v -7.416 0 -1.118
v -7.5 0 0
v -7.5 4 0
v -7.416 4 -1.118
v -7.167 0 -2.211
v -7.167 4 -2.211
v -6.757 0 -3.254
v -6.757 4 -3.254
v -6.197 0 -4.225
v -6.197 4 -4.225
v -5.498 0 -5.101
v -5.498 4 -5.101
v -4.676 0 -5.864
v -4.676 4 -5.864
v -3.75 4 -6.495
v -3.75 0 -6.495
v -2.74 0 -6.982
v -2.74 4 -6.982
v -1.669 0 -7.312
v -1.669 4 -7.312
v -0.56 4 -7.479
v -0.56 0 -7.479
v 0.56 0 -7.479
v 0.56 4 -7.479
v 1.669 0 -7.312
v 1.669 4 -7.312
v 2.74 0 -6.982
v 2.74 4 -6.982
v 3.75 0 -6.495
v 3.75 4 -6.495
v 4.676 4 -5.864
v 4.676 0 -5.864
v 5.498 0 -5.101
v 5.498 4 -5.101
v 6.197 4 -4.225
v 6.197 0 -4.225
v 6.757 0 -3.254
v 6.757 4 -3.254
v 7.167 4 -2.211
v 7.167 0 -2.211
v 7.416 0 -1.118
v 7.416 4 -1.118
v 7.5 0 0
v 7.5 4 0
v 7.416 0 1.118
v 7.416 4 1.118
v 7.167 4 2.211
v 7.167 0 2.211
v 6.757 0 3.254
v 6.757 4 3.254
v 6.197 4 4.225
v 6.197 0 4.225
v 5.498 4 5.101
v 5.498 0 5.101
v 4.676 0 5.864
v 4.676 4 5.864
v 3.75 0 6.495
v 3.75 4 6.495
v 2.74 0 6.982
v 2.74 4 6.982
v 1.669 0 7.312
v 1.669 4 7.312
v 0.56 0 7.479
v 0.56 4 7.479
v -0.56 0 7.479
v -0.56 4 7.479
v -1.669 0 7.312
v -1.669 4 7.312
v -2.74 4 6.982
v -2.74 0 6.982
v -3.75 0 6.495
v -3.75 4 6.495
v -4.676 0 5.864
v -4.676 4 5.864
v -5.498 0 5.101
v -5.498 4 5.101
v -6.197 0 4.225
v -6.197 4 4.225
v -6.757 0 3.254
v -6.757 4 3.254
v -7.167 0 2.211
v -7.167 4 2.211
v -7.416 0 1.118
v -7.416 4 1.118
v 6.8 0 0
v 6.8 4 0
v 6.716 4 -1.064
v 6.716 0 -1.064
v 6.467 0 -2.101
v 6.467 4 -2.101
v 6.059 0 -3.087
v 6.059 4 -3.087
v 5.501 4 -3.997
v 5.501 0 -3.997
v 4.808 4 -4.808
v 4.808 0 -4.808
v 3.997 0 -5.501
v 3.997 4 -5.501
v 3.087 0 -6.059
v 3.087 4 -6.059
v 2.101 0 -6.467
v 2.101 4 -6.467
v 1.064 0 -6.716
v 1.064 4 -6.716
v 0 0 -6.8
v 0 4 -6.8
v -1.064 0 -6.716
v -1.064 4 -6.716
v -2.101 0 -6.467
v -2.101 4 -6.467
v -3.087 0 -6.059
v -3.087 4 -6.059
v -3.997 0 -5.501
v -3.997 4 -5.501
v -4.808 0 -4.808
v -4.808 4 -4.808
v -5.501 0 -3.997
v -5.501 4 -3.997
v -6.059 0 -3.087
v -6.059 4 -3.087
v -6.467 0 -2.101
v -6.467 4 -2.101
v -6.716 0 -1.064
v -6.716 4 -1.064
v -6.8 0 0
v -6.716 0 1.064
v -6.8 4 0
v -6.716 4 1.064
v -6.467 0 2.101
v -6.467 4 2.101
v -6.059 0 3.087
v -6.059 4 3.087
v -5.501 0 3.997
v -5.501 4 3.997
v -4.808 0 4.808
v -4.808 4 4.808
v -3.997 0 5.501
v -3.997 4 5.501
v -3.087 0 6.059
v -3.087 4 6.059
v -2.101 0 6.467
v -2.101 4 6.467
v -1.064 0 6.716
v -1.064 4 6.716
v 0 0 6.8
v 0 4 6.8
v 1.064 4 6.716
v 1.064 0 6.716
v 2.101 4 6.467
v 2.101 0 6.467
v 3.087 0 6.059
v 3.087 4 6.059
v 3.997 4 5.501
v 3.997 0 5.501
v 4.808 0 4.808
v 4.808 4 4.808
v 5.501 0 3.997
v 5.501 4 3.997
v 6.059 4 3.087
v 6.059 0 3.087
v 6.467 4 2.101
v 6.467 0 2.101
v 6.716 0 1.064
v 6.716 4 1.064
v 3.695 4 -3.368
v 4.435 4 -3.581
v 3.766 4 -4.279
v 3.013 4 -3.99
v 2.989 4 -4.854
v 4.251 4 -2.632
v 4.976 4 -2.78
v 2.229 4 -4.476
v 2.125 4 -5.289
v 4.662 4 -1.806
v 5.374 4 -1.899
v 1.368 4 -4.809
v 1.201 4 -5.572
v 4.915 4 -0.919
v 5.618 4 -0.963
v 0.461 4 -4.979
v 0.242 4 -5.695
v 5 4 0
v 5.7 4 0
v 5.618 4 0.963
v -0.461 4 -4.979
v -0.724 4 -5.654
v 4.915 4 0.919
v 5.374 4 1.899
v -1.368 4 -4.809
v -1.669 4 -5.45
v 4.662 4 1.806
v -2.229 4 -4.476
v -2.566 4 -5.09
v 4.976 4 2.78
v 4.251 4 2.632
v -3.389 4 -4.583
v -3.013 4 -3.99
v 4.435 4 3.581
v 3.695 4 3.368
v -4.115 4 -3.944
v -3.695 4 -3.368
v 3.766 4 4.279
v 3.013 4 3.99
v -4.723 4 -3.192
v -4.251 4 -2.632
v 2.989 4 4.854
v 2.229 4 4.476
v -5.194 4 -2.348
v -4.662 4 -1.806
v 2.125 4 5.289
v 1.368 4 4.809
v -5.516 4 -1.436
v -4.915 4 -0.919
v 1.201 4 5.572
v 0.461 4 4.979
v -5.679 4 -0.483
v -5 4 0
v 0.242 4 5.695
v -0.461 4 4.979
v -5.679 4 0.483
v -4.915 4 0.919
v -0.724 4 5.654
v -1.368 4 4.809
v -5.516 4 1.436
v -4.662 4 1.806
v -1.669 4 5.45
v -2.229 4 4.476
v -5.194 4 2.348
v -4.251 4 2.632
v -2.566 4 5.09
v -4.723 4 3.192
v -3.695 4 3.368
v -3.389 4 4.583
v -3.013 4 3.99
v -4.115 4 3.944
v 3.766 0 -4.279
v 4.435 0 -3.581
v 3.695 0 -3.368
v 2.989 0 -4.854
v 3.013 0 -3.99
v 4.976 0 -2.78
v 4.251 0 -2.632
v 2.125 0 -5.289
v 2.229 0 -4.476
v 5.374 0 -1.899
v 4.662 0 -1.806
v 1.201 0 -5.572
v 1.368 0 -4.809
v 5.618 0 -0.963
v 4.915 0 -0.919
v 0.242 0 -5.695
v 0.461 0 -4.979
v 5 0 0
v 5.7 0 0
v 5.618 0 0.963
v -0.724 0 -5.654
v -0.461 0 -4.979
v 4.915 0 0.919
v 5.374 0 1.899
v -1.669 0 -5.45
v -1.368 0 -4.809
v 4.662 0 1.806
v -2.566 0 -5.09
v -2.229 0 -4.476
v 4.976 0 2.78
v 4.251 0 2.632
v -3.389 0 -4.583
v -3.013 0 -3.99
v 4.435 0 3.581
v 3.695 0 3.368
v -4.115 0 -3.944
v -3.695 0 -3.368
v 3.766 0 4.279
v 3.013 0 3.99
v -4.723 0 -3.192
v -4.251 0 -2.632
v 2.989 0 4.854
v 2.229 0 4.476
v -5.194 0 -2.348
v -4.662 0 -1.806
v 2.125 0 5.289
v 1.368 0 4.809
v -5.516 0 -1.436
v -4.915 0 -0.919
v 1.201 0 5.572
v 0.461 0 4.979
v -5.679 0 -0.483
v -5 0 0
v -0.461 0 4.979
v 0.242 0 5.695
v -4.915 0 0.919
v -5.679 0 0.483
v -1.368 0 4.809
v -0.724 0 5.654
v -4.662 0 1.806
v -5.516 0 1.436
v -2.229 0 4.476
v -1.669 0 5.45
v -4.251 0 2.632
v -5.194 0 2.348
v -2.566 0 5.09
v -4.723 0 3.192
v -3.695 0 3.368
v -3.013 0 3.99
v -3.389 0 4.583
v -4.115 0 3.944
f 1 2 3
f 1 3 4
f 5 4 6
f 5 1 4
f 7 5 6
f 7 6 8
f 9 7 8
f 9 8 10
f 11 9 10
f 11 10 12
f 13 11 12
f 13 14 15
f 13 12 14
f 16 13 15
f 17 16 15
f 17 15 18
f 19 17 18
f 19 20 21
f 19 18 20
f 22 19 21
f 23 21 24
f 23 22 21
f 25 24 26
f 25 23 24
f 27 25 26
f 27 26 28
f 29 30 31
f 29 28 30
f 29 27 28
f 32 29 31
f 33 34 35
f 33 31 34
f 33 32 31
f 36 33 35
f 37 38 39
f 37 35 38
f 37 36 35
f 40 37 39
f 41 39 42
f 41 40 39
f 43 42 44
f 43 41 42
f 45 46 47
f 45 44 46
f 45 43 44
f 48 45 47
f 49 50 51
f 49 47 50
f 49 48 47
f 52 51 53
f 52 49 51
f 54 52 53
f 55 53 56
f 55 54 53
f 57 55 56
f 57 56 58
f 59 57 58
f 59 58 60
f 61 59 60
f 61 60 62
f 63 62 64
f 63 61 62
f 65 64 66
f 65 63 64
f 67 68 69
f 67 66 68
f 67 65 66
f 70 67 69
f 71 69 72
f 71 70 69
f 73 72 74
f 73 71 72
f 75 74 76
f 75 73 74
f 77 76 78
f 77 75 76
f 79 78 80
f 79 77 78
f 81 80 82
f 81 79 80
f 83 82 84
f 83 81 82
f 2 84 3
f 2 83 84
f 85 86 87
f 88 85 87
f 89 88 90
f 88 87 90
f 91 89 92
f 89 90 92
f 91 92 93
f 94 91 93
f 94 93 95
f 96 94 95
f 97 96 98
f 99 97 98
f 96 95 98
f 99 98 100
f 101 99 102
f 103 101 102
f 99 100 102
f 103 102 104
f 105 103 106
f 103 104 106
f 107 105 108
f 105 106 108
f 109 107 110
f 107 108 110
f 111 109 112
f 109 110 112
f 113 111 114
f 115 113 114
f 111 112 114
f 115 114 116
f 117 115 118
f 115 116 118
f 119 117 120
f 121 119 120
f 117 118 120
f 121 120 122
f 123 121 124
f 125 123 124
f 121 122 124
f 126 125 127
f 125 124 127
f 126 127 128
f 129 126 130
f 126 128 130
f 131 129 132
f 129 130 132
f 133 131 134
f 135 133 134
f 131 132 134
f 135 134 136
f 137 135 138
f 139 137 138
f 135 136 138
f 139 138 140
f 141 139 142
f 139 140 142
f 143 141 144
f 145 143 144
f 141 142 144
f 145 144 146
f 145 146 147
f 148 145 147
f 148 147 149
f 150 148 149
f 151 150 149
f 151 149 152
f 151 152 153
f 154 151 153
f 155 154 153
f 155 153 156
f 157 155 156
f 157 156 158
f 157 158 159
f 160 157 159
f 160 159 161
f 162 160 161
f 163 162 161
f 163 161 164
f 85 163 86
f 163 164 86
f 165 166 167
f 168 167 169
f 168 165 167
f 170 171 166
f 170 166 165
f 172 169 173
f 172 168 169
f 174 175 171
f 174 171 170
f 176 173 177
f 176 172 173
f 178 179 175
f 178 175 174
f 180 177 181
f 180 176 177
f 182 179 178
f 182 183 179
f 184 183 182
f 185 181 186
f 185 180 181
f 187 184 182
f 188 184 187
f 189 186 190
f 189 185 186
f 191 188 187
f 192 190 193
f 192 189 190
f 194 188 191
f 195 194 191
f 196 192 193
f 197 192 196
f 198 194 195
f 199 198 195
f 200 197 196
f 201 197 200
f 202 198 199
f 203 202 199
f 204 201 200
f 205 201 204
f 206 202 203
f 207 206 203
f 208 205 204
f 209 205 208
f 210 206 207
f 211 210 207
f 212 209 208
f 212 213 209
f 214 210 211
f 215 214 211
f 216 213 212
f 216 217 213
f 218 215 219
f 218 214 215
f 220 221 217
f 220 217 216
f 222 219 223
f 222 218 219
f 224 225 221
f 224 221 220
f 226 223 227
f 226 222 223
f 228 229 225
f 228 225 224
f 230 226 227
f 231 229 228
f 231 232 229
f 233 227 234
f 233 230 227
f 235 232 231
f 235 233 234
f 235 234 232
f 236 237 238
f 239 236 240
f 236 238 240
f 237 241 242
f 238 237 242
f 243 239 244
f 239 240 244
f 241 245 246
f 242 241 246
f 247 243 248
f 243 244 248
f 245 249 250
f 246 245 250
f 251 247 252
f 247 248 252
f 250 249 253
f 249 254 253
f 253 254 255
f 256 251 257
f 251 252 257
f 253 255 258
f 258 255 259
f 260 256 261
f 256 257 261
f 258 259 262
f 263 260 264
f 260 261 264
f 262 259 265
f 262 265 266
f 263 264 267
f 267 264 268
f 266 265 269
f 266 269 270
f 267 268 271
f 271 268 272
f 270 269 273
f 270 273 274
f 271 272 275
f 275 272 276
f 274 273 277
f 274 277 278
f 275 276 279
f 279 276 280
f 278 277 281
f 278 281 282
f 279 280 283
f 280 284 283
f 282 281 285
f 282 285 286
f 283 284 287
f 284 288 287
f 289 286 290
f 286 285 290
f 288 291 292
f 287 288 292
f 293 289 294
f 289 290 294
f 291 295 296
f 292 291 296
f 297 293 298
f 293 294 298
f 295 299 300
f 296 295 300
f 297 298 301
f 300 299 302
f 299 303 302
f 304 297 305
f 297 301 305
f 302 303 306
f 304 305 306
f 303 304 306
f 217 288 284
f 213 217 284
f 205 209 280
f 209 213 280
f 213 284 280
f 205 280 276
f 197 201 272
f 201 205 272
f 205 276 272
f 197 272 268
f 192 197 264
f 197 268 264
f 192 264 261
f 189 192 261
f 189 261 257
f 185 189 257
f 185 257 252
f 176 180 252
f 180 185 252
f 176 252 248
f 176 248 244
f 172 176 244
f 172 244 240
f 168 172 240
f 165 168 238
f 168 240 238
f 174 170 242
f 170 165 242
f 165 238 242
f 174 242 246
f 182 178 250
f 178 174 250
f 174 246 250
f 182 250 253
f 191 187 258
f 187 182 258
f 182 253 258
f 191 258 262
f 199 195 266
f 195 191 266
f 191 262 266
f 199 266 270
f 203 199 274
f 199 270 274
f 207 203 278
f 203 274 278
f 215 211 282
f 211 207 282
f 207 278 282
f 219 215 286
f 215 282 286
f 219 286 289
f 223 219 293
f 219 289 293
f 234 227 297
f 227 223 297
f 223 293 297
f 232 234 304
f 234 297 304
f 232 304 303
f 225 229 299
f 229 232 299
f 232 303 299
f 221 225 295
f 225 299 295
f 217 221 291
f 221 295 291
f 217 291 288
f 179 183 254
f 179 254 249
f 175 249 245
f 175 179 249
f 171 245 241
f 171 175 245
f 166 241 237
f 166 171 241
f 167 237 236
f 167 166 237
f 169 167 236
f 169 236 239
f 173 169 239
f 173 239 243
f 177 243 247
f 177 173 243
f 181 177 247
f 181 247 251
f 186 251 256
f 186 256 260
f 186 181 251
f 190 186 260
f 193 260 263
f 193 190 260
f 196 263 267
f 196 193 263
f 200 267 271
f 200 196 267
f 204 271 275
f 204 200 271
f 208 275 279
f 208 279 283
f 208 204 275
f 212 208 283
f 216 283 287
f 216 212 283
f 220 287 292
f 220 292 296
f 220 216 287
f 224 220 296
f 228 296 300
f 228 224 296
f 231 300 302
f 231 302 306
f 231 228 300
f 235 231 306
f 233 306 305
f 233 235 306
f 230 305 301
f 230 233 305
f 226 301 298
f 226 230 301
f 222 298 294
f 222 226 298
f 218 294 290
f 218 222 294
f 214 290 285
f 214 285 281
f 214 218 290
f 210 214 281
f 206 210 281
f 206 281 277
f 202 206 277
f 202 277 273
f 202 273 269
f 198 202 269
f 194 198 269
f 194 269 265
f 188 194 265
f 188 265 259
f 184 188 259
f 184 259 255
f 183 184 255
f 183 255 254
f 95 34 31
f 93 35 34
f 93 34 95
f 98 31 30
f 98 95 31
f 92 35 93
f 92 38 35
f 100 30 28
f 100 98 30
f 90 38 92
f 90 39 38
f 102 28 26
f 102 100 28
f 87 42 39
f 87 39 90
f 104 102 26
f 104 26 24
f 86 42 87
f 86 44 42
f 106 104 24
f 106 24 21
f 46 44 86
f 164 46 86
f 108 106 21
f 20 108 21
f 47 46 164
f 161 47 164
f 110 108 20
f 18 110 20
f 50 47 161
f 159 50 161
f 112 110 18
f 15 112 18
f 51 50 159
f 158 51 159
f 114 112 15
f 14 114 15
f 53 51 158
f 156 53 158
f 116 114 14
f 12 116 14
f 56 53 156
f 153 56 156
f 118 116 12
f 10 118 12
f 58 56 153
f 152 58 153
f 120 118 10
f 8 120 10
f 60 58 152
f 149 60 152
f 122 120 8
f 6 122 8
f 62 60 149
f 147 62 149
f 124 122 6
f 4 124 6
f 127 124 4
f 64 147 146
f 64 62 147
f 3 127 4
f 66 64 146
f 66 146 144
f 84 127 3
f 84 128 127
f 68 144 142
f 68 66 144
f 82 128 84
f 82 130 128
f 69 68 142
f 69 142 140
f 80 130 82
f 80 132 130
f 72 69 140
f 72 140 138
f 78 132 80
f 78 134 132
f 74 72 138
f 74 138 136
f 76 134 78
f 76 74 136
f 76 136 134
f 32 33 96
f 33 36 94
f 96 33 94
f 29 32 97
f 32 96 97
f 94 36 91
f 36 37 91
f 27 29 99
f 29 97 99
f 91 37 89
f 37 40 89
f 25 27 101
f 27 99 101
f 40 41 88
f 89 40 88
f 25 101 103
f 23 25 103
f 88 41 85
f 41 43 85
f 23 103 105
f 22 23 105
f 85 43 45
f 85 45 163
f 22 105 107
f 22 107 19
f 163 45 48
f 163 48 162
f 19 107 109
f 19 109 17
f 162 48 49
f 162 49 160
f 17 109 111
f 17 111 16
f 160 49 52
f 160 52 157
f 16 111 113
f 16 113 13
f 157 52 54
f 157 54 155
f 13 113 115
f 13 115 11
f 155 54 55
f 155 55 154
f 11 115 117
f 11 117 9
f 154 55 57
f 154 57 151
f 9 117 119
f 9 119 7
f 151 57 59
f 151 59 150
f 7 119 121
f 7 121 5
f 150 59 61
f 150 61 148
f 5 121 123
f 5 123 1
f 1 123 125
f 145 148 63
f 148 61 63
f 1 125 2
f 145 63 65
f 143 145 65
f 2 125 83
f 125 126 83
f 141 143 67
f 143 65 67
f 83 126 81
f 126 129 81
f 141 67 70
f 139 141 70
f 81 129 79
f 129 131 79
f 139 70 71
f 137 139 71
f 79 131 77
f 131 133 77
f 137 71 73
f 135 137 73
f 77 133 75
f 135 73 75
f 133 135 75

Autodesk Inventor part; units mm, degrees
ref_plane "YZ Plane" through (0, 0, 0) normal (1, 0, 0) x (0, 1, 0)
ref_plane "XZ Plane" through (0, 0, 0) normal (0, 1, 0) x (-1, 0, 0)
ref_plane "XY Plane" through (0, 0, 0) normal (0, 0, 1) x (1, 0, 0)
sketch "Sketch1" plane through (0, 0, 0) normal (0, 1, 0) x (-1, 0, 0)
  circle A0 centre (0, 0) radius 5
  circle A1 centre (0, 0) radius 7.5
  dimension "d0" = 10
  dimension "d1" = 15
extrude "Extrusion1" add sketch "Sketch1" along normal blind 4
sketch "Sketch2" plane through (0, 4, 0) normal (0, 1, 0) x (1, 0, 0)
  circle A0 centre (0, 0) radius 5
  circle A1 centre (0, 0) radius 7.5
  circle A2 centre (0, 0) radius 6.8
  circle A3 centre (0, 0) radius 5.7
  dimension "d4" = 0.7
  dimension "d5" = 0.7
extrude "Extrusion2" cut sketch "Sketch2" against normal blind 4 contours A2
properties part number "10x15x4 bearing"
